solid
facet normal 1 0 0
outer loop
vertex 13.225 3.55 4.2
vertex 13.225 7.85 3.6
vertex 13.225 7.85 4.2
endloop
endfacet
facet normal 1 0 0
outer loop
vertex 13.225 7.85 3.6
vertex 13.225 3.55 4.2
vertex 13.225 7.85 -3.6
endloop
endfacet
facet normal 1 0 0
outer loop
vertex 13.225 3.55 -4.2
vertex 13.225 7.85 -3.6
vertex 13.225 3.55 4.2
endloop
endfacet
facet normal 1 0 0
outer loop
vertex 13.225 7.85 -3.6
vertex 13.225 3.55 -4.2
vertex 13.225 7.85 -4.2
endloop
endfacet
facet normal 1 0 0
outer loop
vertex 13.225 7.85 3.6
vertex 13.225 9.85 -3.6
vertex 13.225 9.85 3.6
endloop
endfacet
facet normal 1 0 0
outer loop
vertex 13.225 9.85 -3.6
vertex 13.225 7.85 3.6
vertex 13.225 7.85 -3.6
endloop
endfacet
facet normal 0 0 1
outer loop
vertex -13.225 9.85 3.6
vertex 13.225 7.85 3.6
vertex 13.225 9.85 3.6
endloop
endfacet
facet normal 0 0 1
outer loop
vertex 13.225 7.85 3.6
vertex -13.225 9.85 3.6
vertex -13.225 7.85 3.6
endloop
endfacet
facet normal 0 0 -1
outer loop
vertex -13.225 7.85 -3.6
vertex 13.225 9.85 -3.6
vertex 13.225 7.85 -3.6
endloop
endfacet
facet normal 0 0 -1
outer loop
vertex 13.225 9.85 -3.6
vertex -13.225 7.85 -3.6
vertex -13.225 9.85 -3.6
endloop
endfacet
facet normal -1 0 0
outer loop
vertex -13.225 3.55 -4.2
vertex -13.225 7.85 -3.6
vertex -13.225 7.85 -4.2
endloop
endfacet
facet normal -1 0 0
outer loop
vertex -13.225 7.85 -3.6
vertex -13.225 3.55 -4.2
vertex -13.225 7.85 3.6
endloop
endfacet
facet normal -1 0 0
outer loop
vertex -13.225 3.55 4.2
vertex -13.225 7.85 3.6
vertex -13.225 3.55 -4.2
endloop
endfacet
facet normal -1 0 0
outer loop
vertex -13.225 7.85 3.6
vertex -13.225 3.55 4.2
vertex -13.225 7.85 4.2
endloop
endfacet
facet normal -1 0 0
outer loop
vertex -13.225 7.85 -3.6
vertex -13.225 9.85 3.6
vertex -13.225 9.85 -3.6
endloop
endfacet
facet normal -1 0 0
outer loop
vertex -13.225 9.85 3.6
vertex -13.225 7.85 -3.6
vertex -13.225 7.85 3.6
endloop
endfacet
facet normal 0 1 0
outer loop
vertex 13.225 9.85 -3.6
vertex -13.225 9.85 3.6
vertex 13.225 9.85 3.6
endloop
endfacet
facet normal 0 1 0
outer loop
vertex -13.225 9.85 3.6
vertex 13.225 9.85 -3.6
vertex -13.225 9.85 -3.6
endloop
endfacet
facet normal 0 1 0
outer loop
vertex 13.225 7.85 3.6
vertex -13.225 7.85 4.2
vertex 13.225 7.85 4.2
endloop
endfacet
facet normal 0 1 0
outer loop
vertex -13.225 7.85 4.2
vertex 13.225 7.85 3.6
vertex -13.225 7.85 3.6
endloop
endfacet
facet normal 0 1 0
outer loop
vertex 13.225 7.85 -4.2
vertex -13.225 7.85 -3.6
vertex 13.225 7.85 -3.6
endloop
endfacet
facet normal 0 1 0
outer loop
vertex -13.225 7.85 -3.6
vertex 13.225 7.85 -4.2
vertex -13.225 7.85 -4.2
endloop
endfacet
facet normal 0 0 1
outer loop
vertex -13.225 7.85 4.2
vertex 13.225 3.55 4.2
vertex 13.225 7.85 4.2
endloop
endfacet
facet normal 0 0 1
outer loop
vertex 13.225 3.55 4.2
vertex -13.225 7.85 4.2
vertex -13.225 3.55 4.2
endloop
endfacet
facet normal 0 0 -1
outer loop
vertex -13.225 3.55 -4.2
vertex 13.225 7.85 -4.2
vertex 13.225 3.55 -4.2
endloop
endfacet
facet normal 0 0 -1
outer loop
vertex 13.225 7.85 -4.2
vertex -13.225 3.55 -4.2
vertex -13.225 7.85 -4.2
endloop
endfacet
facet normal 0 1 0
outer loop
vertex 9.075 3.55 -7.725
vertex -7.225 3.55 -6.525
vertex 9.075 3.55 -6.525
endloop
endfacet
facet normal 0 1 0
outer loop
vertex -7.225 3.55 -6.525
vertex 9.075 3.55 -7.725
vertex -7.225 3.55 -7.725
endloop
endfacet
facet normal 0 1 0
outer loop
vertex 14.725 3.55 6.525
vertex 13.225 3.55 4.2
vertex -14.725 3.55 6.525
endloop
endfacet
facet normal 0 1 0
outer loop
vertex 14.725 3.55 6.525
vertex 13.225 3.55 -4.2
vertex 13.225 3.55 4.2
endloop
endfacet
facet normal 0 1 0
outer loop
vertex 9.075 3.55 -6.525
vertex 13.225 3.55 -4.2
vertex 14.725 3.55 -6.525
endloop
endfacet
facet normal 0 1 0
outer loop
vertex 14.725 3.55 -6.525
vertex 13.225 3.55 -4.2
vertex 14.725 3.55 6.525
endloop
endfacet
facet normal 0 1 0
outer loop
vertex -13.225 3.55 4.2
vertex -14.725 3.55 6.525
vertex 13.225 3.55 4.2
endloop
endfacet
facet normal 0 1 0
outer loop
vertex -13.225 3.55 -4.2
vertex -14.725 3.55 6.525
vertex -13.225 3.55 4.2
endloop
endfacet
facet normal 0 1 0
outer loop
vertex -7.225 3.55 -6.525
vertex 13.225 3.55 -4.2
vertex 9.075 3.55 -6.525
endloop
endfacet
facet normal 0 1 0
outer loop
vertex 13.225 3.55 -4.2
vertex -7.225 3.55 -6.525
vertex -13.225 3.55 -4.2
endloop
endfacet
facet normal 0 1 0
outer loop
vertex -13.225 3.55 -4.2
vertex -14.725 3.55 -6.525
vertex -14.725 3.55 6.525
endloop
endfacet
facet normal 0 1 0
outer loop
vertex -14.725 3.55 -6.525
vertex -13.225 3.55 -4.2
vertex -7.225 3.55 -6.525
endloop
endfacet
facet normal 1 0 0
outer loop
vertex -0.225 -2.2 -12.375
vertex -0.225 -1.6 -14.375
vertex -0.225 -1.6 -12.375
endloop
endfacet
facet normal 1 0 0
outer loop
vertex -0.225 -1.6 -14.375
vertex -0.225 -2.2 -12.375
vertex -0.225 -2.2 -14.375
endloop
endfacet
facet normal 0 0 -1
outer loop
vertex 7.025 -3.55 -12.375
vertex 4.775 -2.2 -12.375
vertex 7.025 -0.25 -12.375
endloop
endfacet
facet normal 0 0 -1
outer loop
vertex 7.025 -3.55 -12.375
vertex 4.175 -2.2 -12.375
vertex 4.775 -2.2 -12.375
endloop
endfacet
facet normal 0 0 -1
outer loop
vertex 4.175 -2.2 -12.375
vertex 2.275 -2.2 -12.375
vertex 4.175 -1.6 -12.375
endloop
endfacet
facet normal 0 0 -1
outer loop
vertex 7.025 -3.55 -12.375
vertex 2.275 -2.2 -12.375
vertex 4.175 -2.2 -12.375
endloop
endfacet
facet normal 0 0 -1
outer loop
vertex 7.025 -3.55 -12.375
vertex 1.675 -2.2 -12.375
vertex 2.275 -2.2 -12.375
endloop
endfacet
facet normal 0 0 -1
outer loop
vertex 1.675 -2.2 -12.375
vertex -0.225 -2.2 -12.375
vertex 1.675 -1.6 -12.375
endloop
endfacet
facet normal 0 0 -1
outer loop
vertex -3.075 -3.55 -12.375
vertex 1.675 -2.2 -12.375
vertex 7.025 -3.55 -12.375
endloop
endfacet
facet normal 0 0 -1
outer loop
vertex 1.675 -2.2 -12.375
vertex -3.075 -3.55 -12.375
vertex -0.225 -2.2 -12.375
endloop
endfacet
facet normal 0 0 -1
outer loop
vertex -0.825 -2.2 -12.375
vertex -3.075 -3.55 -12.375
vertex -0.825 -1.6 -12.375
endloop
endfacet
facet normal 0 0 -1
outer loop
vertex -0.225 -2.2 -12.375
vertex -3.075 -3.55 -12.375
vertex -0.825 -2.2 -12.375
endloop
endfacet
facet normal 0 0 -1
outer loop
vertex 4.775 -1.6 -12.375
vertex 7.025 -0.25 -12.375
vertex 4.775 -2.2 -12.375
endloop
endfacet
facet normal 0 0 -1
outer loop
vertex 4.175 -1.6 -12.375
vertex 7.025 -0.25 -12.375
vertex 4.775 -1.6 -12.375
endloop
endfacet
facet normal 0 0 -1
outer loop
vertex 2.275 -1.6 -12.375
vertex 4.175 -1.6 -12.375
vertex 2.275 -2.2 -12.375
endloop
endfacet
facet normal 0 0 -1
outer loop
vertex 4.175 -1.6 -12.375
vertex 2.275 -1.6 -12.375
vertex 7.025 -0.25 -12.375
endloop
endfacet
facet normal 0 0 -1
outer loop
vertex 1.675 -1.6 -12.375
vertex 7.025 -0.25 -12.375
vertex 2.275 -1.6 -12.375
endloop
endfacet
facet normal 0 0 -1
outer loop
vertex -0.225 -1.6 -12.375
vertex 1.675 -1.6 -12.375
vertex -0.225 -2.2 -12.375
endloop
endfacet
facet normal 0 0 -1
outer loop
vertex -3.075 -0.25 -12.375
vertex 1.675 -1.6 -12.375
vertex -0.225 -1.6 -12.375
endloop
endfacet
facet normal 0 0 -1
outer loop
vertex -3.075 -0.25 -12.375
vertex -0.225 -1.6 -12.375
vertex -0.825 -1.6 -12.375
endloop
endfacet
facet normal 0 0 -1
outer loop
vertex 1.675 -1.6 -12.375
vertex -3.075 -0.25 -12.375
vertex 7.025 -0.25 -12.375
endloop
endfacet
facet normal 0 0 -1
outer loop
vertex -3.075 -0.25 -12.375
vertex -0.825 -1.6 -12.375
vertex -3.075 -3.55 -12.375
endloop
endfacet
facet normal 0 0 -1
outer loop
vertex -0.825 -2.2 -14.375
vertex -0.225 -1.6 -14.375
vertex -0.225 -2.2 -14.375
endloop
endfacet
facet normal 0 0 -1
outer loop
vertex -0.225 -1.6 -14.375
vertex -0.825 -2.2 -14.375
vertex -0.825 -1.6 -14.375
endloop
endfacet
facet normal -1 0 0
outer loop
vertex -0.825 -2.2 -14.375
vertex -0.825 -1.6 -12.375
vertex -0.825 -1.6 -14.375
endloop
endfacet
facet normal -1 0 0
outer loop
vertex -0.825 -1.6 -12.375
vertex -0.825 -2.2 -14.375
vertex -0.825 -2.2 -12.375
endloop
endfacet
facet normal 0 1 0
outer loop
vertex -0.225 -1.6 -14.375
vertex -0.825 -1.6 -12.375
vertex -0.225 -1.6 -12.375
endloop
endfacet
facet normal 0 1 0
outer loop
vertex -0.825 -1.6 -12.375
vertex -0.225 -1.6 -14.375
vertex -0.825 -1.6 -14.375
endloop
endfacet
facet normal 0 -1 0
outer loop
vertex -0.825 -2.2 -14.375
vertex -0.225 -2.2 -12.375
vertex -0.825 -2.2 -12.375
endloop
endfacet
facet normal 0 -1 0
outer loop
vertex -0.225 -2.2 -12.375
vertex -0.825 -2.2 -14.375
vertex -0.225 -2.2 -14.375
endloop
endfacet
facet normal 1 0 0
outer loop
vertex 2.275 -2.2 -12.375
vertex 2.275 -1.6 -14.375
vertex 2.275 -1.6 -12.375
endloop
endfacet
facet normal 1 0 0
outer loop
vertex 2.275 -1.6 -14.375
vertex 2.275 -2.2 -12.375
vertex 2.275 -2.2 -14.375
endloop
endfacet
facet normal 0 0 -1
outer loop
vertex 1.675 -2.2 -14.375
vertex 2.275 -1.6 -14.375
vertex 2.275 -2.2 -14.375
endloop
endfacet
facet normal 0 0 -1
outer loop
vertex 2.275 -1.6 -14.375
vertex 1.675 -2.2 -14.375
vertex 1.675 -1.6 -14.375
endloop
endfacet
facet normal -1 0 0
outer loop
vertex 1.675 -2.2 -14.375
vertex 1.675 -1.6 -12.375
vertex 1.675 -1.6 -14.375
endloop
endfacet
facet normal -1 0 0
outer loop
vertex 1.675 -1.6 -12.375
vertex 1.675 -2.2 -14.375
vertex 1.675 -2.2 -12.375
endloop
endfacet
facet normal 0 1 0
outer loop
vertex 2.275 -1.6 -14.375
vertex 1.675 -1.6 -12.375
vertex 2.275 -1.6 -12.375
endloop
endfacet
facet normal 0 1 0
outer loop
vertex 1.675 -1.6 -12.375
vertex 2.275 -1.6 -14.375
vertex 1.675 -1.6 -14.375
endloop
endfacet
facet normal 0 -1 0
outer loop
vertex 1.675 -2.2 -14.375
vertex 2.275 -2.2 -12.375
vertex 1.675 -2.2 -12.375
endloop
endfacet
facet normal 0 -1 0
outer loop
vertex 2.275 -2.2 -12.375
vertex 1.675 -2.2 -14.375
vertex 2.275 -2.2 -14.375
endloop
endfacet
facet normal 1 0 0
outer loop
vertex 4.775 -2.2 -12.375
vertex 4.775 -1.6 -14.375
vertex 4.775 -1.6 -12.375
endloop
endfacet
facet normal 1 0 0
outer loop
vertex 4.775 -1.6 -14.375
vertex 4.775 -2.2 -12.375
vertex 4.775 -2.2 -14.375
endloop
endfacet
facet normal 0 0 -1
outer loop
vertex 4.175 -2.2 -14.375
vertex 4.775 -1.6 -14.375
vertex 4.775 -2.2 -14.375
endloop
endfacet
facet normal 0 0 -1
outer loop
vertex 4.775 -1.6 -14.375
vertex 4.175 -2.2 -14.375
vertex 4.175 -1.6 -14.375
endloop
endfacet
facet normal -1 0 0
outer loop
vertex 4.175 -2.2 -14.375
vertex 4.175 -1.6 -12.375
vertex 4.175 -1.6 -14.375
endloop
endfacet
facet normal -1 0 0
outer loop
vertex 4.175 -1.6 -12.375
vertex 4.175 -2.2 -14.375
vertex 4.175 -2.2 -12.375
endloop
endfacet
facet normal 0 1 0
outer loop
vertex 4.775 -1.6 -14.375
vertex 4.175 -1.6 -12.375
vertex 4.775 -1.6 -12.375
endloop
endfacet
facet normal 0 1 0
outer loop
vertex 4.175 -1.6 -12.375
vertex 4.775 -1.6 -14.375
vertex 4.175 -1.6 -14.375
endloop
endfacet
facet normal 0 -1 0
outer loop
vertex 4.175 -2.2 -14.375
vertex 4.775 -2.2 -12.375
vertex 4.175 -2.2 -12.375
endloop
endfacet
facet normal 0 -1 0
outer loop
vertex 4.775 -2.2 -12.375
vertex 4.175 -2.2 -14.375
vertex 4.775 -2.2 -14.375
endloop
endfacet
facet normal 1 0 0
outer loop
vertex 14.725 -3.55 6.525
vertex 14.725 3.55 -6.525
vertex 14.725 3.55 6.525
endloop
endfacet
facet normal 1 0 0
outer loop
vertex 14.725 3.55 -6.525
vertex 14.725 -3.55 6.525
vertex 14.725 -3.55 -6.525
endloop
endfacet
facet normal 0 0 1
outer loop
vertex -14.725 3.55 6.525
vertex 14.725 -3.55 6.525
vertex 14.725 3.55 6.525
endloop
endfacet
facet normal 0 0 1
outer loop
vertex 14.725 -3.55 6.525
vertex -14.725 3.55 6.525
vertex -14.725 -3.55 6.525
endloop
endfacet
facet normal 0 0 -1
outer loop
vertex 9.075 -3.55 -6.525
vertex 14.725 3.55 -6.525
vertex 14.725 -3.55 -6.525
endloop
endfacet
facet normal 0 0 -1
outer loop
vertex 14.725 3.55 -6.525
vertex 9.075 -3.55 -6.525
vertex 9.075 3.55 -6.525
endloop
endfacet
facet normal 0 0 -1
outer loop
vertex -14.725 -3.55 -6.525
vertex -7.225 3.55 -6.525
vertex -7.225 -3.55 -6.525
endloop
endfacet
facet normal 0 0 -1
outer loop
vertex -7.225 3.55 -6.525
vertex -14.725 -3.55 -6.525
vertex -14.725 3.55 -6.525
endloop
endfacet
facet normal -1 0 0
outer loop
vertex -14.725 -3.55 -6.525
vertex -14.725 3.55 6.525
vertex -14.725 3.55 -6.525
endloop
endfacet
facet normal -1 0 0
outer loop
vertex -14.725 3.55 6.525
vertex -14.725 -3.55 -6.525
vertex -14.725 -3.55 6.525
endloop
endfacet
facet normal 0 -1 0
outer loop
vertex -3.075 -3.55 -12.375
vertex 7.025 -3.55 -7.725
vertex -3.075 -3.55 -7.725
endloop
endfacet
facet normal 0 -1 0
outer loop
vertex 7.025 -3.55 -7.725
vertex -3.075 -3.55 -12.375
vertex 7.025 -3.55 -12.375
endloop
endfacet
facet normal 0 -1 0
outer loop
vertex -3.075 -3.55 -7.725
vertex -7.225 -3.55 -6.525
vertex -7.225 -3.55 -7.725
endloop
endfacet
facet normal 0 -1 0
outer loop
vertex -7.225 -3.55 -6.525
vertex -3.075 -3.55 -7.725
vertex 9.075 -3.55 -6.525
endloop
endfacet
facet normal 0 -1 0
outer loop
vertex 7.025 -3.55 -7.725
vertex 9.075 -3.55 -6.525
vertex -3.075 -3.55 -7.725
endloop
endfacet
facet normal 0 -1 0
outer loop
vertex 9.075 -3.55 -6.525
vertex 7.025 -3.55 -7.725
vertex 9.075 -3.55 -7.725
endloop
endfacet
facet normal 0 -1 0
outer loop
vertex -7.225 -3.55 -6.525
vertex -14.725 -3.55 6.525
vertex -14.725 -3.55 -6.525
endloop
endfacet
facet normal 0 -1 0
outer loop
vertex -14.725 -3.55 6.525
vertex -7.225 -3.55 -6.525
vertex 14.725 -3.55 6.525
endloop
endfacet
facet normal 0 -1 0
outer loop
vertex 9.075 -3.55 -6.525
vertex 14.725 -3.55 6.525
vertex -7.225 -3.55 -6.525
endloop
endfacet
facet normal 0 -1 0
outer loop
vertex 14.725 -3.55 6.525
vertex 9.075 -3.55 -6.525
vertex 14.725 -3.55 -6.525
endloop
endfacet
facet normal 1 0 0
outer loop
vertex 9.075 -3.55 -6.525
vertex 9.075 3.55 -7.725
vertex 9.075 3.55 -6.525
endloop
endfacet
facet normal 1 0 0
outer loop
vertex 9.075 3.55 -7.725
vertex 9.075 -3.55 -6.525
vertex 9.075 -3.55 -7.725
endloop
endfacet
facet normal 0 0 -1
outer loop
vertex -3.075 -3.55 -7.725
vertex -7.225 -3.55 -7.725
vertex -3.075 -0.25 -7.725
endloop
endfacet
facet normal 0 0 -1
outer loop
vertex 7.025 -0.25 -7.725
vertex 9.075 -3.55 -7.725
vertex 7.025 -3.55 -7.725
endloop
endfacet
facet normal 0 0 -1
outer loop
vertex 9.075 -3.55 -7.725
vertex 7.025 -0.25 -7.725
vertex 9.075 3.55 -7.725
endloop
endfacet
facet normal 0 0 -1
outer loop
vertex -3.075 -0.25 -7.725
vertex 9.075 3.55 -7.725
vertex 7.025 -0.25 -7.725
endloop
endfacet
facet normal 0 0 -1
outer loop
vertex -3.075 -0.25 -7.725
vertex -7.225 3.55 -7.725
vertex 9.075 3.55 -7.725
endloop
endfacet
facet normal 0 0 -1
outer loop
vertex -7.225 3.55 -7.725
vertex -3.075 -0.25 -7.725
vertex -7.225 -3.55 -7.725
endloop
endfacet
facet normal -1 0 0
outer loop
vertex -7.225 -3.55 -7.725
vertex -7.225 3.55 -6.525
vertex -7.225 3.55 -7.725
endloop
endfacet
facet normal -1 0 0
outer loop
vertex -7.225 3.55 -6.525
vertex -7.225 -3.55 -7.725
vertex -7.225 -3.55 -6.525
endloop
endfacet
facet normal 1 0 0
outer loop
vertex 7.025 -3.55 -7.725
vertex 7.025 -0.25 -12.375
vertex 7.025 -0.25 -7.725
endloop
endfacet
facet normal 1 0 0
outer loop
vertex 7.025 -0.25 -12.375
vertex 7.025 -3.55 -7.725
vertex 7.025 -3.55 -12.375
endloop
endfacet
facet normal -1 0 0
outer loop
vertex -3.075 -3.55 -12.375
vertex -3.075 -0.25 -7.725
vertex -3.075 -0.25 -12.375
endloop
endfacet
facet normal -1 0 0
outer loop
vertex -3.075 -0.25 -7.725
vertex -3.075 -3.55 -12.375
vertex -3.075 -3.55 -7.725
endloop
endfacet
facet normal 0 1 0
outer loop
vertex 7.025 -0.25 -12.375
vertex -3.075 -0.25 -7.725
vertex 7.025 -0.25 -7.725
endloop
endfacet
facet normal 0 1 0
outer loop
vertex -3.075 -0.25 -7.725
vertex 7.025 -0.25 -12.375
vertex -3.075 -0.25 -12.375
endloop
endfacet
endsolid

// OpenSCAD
$fn = 64;

module gp2y0d413k0f() {
    // 1. Main Case (Carbonic ABS)
    color("#222222")
    translate([0, 0, 0])
    cube([29.45, 7.1, 13.05], center=true);

    // 2. Lens Case
    color("#222222") {
        // Base part of lens case
        translate([0, 7.1/2 + (6.3 - 2.0)/2, 0])
        cube([26.45, 6.3 - 2.0, 8.4], center=true);
        
        // Front part of lens case
        difference() {
            translate([0, 7.1/2 + 6.3 - 2.0/2, 0])
            cube([26.45, 2.0, 7.2], center=true);
            
            // Cutout for Left Lens (Light emitter)
            translate([-29.45/2 + 4.5, 7.1/2 + 6.3, 0])
            rotate([90, 0, 0])
            cylinder(h=2.0, d=5.0, center=true);
            
            // Cutout for Right Lens (Light detector)
            translate([-29.45/2 + 4.5 + 19.7, 7.1/2 + 6.3, 0])
            cube([6.0, 2.0, 4.5], center=true);
        }
    }

    // 3. Lenses
    // Left Lens (Light emitter)
    color("#330000")
    translate([-29.45/2 + 4.5, 7.1/2 + 6.3 - 0.5, 0])
    rotate([90, 0, 0])
    cylinder(h=1.0, d=5.0, center=true);

    // Right Lens (Light detector)
    color("#000033")
    translate([-29.45/2 + 4.5 + 19.7, 7.1/2 + 6.3 - 0.5, 0])
    cube([6.0, 1.0, 4.5], center=true);

    // 4. PWB
    color("#005500")
    translate([-29.45/2 + 7.5 + 16.3/2, 0, -13.05/2 - 1.2/2])
    cube([16.3, 7.1, 1.2], center=true);

    // 5. Connector
    color("#DDDDDD")
    translate([-29.45/2 + 7.5 + 4.15 + 10.1/2, -7.1/2 + 3.3/2, -13.05/2 - 1.2 - 4.65/2])
    cube([10.1, 3.3, 4.65], center=true);

    // Connector Pins
    color("#AAAAAA")
    for (i = [-1, 0, 1]) {
        translate([-29.45/2 + 7.5 + 4.15 + 10.1/2 + i*2.5, -7.1/2 + 3.3/2, -13.05/2 - 1.2 - 4.65 - 1.0])
        cube([0.6, 0.6, 2.0], center=true);
    }
}

gp2y0d413k0f();
